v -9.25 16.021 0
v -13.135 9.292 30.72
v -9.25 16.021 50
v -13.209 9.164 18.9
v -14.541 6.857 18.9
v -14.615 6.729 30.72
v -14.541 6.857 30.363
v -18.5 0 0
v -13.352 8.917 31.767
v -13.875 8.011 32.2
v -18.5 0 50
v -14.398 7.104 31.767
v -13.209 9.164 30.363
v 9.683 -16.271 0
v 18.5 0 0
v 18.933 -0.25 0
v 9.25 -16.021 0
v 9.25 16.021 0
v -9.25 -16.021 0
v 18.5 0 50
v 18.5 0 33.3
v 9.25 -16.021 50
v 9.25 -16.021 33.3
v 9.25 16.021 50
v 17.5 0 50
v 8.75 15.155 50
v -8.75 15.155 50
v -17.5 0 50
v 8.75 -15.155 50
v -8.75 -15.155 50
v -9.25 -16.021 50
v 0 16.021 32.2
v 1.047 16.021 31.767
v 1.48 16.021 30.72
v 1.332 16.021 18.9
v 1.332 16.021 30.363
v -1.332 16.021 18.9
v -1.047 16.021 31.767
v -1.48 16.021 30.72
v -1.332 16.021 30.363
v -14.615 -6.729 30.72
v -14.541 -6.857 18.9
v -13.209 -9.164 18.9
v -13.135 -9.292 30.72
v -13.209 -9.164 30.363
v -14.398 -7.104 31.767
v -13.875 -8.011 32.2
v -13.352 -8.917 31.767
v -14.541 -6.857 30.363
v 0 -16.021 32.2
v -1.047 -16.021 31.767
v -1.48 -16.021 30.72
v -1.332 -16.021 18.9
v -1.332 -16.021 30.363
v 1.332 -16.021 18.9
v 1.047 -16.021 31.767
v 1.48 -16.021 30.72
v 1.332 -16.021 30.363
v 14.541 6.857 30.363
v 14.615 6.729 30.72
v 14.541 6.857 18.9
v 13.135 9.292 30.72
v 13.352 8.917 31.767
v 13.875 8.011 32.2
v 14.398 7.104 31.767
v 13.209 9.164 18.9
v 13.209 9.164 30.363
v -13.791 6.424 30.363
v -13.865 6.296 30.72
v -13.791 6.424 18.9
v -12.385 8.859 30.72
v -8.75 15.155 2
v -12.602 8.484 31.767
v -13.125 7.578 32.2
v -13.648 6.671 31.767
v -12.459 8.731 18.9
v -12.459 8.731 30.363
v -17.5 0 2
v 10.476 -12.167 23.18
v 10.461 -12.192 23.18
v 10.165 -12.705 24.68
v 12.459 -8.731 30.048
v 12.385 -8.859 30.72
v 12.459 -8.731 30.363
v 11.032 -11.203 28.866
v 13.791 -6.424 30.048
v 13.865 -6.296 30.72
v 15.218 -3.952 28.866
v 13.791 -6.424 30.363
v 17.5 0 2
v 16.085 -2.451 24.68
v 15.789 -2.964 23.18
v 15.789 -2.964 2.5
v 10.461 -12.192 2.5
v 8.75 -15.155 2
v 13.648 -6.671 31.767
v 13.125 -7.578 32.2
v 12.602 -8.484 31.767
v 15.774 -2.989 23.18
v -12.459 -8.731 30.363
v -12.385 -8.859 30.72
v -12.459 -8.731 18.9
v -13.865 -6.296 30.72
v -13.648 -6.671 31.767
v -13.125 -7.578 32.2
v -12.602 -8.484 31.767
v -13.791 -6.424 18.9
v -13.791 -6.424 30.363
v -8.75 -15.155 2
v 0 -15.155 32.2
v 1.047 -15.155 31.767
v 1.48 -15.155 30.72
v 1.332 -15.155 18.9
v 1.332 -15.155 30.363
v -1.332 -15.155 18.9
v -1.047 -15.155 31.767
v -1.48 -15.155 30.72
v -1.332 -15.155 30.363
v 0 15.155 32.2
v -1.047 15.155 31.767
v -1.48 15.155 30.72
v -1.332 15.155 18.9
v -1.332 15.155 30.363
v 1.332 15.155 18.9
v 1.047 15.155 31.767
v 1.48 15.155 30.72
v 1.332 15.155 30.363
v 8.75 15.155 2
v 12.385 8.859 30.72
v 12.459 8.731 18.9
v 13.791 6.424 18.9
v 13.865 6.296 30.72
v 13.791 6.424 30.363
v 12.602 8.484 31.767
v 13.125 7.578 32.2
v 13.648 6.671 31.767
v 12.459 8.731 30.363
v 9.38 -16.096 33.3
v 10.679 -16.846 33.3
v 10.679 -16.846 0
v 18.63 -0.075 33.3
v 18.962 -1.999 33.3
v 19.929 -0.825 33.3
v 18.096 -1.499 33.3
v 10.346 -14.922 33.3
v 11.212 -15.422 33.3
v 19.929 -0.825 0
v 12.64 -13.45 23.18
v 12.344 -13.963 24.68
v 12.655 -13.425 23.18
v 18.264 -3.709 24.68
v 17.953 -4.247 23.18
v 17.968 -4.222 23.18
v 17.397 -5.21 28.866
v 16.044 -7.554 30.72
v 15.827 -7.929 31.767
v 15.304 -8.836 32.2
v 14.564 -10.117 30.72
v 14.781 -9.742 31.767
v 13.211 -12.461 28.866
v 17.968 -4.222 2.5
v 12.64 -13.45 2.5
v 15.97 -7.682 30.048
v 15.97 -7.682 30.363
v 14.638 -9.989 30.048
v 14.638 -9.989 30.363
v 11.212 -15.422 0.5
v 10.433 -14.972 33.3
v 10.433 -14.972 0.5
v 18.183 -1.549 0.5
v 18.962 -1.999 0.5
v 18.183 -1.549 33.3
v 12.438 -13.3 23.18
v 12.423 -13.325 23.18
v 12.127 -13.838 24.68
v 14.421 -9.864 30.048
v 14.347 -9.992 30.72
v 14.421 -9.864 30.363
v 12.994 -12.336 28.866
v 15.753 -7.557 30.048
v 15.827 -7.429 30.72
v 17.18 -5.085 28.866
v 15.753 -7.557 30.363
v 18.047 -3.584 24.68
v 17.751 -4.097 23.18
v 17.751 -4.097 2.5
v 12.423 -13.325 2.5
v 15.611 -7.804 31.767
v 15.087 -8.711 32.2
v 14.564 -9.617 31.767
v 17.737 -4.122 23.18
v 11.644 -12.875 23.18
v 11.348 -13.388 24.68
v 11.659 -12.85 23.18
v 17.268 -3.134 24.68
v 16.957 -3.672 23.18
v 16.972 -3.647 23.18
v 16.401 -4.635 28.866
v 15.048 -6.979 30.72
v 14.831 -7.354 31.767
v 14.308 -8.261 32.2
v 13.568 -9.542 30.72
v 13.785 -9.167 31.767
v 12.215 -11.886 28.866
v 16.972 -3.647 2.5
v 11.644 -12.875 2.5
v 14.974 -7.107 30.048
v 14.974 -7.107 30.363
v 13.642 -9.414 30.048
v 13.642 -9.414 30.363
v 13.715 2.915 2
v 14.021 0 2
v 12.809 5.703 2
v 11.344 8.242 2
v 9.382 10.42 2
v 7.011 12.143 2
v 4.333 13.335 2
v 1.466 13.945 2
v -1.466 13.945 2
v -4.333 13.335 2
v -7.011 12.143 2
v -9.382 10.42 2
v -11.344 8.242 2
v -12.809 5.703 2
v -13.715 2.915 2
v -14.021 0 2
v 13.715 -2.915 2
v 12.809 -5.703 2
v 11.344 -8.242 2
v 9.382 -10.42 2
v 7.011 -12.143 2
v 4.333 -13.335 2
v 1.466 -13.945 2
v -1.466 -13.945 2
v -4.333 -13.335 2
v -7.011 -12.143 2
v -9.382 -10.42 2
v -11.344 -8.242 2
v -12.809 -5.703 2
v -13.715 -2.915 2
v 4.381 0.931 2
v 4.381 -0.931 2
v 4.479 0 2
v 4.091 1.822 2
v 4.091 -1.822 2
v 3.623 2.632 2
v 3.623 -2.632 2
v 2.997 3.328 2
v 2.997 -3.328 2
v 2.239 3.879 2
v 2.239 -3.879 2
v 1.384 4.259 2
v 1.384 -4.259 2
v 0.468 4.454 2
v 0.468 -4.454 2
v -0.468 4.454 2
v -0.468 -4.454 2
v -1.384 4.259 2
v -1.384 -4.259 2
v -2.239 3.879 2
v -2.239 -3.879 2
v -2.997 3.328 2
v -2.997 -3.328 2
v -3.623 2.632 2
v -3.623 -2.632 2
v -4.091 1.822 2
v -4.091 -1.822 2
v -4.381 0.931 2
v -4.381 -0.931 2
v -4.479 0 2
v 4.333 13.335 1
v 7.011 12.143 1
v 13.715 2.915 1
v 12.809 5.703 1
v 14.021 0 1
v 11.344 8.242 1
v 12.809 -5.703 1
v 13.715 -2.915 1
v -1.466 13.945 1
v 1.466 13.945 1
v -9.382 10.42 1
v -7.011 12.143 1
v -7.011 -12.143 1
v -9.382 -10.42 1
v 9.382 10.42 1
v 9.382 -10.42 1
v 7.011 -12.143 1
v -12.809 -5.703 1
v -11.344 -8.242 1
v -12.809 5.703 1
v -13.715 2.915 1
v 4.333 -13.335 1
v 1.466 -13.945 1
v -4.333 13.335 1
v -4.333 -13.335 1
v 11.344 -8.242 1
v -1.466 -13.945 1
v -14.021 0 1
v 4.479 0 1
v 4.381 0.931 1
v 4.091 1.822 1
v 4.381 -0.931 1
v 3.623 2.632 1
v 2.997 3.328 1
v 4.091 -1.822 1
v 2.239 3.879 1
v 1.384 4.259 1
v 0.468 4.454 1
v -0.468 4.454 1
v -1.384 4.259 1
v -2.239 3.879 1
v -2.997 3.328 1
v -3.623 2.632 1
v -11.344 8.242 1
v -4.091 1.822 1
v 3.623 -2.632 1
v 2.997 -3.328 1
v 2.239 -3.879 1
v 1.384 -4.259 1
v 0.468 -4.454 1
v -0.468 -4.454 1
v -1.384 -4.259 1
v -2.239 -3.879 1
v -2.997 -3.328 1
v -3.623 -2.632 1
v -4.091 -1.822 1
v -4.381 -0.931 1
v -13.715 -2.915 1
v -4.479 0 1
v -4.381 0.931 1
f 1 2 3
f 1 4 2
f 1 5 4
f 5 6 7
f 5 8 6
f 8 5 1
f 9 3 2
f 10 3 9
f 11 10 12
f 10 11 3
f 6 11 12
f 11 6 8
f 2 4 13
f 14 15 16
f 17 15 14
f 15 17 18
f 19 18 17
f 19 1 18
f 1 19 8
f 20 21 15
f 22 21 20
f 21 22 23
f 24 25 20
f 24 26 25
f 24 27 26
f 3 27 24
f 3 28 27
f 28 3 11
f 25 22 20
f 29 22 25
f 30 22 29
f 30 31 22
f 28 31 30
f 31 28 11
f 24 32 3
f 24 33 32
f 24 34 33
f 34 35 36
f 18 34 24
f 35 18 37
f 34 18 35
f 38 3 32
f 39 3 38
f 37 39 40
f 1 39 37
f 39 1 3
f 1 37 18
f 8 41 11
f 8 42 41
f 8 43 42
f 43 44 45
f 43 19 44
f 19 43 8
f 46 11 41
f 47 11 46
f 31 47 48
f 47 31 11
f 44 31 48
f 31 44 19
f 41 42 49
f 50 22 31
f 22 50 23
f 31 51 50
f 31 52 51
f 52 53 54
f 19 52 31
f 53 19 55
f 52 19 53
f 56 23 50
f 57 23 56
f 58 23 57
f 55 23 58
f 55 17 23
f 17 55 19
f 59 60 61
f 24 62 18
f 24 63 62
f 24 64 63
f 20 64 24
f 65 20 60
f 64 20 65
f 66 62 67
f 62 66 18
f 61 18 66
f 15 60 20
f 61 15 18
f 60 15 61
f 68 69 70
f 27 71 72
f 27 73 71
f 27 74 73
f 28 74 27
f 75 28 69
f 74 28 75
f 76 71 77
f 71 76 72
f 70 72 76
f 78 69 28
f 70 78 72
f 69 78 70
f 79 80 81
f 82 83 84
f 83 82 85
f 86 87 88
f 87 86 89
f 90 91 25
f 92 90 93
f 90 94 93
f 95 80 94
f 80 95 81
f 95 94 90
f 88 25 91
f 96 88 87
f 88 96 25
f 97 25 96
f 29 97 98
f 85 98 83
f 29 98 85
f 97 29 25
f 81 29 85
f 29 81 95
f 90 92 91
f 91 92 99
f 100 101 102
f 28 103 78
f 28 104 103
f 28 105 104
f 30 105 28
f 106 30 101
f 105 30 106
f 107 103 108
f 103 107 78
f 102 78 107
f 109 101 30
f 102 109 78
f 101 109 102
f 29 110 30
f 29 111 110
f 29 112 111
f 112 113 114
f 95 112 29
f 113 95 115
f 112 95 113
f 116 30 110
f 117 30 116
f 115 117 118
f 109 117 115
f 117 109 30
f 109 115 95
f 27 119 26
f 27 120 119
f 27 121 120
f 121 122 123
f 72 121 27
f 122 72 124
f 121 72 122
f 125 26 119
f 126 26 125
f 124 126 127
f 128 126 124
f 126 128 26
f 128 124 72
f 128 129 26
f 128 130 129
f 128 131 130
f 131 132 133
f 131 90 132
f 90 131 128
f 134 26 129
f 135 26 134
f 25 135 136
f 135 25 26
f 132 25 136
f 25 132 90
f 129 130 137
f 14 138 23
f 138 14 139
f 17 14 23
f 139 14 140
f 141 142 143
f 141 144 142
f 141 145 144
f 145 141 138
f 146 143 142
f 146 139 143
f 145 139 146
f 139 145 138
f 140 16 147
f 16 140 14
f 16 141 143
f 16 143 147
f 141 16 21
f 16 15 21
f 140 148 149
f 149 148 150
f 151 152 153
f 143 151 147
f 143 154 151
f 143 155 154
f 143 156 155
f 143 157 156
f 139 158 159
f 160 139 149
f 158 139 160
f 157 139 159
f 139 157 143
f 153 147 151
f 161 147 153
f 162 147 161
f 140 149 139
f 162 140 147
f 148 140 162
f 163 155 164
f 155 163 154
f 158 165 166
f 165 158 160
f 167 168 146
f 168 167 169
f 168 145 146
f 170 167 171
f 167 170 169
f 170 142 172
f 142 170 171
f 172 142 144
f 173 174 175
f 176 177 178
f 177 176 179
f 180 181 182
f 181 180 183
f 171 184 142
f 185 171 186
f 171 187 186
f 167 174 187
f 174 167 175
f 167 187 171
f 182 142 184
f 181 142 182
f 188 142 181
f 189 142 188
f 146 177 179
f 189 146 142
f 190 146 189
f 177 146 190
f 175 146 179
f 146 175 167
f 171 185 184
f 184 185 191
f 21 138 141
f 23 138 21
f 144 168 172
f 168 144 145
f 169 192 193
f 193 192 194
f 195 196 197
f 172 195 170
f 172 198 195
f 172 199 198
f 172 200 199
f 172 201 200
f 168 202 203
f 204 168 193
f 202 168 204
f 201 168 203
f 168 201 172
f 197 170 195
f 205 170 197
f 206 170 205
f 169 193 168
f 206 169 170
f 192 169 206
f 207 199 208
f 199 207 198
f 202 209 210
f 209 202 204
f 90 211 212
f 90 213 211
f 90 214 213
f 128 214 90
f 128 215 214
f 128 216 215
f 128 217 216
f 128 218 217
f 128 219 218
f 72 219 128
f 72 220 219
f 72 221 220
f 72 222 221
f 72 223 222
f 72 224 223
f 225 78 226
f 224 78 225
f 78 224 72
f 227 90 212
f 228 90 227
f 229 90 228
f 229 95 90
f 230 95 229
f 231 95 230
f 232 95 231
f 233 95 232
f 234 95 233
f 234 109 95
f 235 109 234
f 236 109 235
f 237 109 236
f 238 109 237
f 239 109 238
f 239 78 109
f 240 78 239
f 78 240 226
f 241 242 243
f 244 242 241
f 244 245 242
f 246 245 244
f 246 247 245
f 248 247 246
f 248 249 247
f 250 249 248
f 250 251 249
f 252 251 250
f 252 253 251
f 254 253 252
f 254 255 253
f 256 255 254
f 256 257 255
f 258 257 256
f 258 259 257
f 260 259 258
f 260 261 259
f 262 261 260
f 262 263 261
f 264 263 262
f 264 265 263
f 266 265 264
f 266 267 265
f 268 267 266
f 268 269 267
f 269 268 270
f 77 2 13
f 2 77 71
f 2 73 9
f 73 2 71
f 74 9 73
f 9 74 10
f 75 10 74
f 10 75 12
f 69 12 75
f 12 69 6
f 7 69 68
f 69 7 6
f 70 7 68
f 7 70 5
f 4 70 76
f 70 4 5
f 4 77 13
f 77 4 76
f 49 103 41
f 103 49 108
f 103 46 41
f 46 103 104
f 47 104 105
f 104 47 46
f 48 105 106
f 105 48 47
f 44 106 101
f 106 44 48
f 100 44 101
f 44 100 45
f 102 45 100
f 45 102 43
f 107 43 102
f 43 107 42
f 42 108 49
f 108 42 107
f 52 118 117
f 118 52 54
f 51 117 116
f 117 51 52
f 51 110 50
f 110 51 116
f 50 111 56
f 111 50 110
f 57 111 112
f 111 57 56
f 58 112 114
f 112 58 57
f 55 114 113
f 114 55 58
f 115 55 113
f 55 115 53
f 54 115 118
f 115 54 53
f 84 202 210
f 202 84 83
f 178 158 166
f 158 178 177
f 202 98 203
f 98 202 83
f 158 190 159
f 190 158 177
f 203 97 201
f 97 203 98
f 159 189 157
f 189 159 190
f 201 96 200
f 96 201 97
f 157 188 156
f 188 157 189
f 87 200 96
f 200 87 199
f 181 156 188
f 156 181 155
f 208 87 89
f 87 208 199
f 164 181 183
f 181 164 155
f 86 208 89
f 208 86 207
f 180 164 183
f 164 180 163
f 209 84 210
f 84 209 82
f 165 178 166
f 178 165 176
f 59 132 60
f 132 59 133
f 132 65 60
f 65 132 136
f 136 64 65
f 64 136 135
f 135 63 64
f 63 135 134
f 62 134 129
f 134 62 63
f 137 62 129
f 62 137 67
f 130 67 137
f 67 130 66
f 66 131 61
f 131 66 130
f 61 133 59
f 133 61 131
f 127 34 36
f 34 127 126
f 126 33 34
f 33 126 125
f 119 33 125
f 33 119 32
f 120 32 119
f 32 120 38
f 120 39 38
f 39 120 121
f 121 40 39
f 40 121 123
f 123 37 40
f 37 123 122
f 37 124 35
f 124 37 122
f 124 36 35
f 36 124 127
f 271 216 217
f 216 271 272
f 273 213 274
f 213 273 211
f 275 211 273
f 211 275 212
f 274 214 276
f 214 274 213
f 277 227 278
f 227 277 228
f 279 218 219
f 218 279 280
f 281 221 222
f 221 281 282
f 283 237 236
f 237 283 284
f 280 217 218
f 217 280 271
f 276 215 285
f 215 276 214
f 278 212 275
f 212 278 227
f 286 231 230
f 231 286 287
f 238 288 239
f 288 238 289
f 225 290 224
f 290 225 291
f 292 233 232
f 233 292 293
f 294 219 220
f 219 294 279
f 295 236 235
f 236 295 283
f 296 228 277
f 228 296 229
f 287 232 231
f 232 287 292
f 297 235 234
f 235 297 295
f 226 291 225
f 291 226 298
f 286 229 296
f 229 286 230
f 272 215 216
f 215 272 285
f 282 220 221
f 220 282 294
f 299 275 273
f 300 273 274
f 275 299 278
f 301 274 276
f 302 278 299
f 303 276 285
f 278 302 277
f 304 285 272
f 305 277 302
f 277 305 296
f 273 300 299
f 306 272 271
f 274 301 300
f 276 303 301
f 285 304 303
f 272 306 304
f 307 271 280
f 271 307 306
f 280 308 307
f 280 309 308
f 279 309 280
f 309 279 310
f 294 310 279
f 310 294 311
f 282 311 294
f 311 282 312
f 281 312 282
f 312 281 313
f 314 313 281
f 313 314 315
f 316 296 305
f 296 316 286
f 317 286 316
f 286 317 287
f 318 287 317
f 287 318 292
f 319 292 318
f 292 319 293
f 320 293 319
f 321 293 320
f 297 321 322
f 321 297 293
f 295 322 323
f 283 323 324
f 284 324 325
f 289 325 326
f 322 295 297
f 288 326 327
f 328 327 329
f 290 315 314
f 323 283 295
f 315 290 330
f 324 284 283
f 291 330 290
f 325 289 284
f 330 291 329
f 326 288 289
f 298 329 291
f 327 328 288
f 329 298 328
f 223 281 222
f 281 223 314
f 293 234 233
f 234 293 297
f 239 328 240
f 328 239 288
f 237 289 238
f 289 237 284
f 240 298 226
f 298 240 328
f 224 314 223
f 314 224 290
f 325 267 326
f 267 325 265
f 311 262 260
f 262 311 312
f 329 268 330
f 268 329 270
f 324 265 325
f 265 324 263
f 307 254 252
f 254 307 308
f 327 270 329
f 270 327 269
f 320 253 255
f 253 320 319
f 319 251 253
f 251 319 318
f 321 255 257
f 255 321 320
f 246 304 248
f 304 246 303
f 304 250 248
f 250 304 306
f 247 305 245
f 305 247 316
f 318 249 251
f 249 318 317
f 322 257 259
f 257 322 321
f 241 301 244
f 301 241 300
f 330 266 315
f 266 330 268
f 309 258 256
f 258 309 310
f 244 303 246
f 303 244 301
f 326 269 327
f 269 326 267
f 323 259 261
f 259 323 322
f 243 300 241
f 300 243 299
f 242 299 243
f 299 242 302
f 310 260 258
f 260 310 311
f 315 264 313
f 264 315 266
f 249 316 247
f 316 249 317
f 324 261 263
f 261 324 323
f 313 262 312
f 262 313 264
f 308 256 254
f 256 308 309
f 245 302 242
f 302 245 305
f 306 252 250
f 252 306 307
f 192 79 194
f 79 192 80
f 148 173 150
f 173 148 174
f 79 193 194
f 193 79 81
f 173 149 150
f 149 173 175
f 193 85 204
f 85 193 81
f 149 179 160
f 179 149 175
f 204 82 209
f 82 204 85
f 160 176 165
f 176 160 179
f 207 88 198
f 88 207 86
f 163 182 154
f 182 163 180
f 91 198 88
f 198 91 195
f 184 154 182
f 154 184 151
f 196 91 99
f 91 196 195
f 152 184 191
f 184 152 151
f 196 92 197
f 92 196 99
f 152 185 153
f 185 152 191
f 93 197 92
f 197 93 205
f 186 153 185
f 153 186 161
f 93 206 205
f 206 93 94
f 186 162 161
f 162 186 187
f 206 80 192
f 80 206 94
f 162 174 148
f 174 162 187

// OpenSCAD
// file: neuturm.scad
use <MCAD/regular_shapes.scad>

// Setup
// höhe, seite, array durchgänge, array tore
hoehe = 50;
radius = 18.5;
seite = 18.5;
tore = [4];
durchgaenge = [];

// Berechnete größen

sideRad = seite * sqrt(3)/2;


module move(x=0,y=0,z=0,rx=0,ry=0,rz=0)
{ translate([x,y,z])rotate([rx,ry,rz]) children(); }

module wallmove(x=0, y=0, z=0, seite=0) {
  rotate([0,0,seite*60]) translate([x,y,z]) children();
}

function flatten(l) = [ for (a = l) for (b = a) b ] ;


/* move(30,sideRad+10,1, 0, 0, 0) zinnenkranz();
turm(); */

module turm() {
  difference() {
    // turmkörper
    union() {
      hexagon_tube(hoehe, radius, 1);
      hexagon_prism(2,radius);
      for (i = tore) {
        wallmove(0, sideRad-.1, 0, i)
        tor();
      }
        mauerstruktur();
    }
    for (i = flatten([durchgaenge, tore])) {
      wallmove(0, sideRad-2, 1, i)
       toroeffnung();
    }
    for (i = [1:6]) {
      wallmove(0, sideRad-2, 10, i)
       fenster();
    }
    move(0,0,1) cylinder_tube(5, sideRad-2, radius);
  }
}

module zinnenkranz() {
move(0, 0, -1)
  difference() {
    union() {
    difference() {
      translate([0,0,0]) hexagon_tube(7,radius +3.5,2);
        zinnen();
    }
    move(0,0,3) hexagon_prism(1, radius +1.5);
    move(0,0,0) hexagon_prism(3, radius -1.2);
    }
    for(i = durchgaenge) {
    rotate([0,0,i*60]) translate([0, sideRad+2.2, 4]) cube([radius*2,4,radius +1.5], center = true);
    }
  }
}

module tor() {
  torbreit = seite;
  torhoch = torbreit*1.8;
  color("Green") {
    move(0,0, torhoch/2) cube([torbreit, 1.2, torhoch], center = true);
    move(0,1, torhoch/2) difference() {
      cube([torbreit, 1.5, torhoch], center=true);
      move(0,0,2) cube([torbreit-3, 1, torhoch + 3], center=true);
    }
  }
}

module toroeffnung() {
  $fn = 8;
  torbreit = seite - seite/5;
  torhoch = hoehe/3 - (hoehe/30);
  rundungdm = torbreit/2 -torbreit/10;
  //
  translate([0,5,rundungdm*4]) {
    union() {
      rotate([90,0,0]) {
        linear_extrude(6) {
          circle(rundungdm);
          move(0, -rundungdm*2) square([rundungdm*1.8, (rundungdm*4)-3], center=true);
        }
      }
    }
  }
}

module fenster() {
  $fn = 8;
  fensterbreit = seite/5;
  fensterhoch = hoehe;
  fensterdm = fensterbreit/2 -fensterbreit/10;
  //
  translate([0,5,fensterdm*14]) {
    union() {
      rotate([90,0,0]) {
        linear_extrude(6) {
          circle(fensterdm);
          move(0, -fensterdm*4) square([fensterdm*1.8, (fensterdm*10)-3], center=true);
        }
      }
    }
  }

}

module mauerstruktur() {
  for (i = [1:6]) {
    move(rz=i*60)
    move(x=-sideRad/2-.5,y=-sideRad+0.1, rx=90) {
        scale([radius / 72, (hoehe-2) / 108, 0.9/ 256])
        surface(file = "mauer2.png", convexity = 3);
    }
  }
}


module solomauer() {
  cube([seite, 1, hoehe]);
  move(x=0,y=0, rx=90) {
    scale([radius / 72, (hoehe-2) / 108, 0.9/ 256])
    surface(file = "mauer2.png", convexity = 3);
  }
}


module zinnen() {
  zinB = seite/6;
  zinVers = seite/6 * 1.8;
  echo(zinB);
  for (i = [1:6]) {
    rotate([0,0,i*60]) {
      color("Blue") {
        translate([0, sideRad, 7]) {
          translate([-zinVers,0,0]) cube([zinB,7,5], center= true);
          translate([0,0,0]) cube([zinB,7,5], center= true);
          translate([zinVers,0,0]) cube([zinB,7,5], center= true);
        }
      }
    }
  }
}
// main file
use <neuturm.scad>

hoehe = 50;
radius = 18.5;
seite = 18.5;
tore = [4];
durchgaenge = [];



turm();
